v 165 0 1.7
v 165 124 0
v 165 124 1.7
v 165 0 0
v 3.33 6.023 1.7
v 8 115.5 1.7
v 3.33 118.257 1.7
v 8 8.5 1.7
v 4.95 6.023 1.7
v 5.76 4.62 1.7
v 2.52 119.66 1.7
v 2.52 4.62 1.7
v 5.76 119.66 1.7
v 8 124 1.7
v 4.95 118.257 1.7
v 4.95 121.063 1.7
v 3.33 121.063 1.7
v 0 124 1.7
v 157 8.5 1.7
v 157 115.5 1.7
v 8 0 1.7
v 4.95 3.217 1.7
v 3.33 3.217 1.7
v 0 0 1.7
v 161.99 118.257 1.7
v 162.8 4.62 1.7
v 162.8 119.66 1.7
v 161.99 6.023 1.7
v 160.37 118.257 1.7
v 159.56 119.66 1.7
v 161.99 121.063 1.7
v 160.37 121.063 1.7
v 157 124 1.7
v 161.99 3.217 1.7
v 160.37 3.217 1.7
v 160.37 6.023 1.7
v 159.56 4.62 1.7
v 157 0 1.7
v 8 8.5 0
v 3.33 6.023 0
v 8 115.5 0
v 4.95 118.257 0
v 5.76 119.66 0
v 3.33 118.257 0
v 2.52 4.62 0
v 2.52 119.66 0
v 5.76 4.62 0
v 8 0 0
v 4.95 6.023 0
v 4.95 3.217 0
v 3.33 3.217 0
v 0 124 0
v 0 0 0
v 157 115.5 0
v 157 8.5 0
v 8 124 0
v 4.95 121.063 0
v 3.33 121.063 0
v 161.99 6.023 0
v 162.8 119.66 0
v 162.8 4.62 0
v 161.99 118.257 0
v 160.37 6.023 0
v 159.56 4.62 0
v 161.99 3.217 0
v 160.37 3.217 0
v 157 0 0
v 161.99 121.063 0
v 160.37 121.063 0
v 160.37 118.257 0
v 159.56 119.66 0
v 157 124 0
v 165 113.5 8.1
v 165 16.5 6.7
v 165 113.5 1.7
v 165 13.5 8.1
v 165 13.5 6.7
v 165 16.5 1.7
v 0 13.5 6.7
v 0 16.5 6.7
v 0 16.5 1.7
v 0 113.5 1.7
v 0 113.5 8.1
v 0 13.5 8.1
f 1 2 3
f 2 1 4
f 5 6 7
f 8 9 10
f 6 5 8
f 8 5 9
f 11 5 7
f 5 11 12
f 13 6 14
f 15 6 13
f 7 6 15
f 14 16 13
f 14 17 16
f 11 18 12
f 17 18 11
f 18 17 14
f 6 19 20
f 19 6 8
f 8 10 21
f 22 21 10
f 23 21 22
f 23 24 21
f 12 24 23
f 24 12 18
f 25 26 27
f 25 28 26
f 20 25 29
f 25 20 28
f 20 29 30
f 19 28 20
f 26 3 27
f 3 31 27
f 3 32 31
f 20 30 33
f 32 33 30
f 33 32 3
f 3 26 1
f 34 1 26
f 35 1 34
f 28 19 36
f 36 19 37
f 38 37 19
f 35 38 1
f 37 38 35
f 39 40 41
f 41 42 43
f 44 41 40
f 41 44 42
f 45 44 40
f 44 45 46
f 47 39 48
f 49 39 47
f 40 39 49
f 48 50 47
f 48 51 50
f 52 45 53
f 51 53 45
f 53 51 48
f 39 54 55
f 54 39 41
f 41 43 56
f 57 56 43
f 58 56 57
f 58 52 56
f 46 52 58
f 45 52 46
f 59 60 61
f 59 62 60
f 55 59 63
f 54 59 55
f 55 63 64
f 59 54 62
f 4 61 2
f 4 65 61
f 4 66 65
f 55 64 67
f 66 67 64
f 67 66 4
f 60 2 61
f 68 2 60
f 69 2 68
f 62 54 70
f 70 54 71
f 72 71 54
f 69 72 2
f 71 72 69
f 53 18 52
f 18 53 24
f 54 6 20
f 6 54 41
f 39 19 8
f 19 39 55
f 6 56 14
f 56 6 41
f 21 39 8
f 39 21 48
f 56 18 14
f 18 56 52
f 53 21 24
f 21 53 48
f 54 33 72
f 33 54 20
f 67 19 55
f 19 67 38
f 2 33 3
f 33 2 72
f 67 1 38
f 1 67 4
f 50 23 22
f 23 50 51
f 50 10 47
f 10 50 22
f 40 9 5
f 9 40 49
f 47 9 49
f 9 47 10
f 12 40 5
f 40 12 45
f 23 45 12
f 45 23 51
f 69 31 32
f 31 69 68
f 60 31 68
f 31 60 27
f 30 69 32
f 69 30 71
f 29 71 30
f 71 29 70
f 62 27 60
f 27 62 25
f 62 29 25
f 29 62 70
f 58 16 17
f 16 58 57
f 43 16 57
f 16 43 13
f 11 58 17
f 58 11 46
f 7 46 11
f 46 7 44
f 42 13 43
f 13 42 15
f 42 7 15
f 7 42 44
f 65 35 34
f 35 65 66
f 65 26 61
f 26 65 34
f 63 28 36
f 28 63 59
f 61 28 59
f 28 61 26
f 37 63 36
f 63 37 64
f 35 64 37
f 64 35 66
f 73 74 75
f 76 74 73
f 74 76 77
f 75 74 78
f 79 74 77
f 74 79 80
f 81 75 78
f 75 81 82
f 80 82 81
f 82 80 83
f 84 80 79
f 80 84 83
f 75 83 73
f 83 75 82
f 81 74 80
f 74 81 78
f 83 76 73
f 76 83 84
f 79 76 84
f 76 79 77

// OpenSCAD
module pcbHoles(r, l){
    hr = 3.24;
    dx = 153.8+hr;
    dy = 111.8+hr;

    ox = 2.52+hr/2;
    oy = 3 +hr/2;
    translate([ox, oy, 0]){
        cylinder(l, r, r);
        translate([dx, dy, 0])
            cylinder(l, r, r);
        translate([0, dy, 0])
            cylinder(l, r, r);
        translate([dx, 0, 0])
            cylinder(l, r, r);
    }
}

module pcbBoard(){
    mx = 165;
    my = 107;
    z = 1.7;
    tx = 8;
    ty = 124;
    tl = (ty-my)/2;
    translate([0, tl, 0]){
        cube([mx, my, z]);
        translate([0, -tl, 0])
            cube([tx, ty, z]);
        translate([mx-tx, -tl, 0])
            cube([tx, ty, z]);
    }
}

module toPcbEdge(){
    translate([0,(124-107)/2,0]){
        children();
    }
}
module pcb(){
    color([0,0,1])
    difference(){
        pcbBoard();
        translate([0,0,-1])
            pcbHoles(3.24/2, 5);
    }
}

module toPcbTop(){
    translate([0,0,1.7])
        children();
}

module placeTftBezel(){
    translate([0,8,0])
        children();
}
module tftBezel(){
    color([0.5, 0.5, 0.5])
        cube([165,97, 5]);
}

module tftDisplayArea(t){
    translate([1.5,6.5, 0])
        cube([157,89,t]);
}

module tftGlass(){
    color([0.5, 0.5, 1], 0.5)
    cube([165, 100, 1.4]);
}

module tft(){
    difference(){
        tftBezel();
        translate([0,0,2])
            tftDisplayArea(10);
    }
    color([0.1, 0.1, 0.1])
        tftDisplayArea(5);
    translate([0,-3,5])
        tftGlass();
}





module display(){
    pcb();
    toPcbTop()
        toPcbEdge()
            placeTftBezel()
                tft();
}


display();
